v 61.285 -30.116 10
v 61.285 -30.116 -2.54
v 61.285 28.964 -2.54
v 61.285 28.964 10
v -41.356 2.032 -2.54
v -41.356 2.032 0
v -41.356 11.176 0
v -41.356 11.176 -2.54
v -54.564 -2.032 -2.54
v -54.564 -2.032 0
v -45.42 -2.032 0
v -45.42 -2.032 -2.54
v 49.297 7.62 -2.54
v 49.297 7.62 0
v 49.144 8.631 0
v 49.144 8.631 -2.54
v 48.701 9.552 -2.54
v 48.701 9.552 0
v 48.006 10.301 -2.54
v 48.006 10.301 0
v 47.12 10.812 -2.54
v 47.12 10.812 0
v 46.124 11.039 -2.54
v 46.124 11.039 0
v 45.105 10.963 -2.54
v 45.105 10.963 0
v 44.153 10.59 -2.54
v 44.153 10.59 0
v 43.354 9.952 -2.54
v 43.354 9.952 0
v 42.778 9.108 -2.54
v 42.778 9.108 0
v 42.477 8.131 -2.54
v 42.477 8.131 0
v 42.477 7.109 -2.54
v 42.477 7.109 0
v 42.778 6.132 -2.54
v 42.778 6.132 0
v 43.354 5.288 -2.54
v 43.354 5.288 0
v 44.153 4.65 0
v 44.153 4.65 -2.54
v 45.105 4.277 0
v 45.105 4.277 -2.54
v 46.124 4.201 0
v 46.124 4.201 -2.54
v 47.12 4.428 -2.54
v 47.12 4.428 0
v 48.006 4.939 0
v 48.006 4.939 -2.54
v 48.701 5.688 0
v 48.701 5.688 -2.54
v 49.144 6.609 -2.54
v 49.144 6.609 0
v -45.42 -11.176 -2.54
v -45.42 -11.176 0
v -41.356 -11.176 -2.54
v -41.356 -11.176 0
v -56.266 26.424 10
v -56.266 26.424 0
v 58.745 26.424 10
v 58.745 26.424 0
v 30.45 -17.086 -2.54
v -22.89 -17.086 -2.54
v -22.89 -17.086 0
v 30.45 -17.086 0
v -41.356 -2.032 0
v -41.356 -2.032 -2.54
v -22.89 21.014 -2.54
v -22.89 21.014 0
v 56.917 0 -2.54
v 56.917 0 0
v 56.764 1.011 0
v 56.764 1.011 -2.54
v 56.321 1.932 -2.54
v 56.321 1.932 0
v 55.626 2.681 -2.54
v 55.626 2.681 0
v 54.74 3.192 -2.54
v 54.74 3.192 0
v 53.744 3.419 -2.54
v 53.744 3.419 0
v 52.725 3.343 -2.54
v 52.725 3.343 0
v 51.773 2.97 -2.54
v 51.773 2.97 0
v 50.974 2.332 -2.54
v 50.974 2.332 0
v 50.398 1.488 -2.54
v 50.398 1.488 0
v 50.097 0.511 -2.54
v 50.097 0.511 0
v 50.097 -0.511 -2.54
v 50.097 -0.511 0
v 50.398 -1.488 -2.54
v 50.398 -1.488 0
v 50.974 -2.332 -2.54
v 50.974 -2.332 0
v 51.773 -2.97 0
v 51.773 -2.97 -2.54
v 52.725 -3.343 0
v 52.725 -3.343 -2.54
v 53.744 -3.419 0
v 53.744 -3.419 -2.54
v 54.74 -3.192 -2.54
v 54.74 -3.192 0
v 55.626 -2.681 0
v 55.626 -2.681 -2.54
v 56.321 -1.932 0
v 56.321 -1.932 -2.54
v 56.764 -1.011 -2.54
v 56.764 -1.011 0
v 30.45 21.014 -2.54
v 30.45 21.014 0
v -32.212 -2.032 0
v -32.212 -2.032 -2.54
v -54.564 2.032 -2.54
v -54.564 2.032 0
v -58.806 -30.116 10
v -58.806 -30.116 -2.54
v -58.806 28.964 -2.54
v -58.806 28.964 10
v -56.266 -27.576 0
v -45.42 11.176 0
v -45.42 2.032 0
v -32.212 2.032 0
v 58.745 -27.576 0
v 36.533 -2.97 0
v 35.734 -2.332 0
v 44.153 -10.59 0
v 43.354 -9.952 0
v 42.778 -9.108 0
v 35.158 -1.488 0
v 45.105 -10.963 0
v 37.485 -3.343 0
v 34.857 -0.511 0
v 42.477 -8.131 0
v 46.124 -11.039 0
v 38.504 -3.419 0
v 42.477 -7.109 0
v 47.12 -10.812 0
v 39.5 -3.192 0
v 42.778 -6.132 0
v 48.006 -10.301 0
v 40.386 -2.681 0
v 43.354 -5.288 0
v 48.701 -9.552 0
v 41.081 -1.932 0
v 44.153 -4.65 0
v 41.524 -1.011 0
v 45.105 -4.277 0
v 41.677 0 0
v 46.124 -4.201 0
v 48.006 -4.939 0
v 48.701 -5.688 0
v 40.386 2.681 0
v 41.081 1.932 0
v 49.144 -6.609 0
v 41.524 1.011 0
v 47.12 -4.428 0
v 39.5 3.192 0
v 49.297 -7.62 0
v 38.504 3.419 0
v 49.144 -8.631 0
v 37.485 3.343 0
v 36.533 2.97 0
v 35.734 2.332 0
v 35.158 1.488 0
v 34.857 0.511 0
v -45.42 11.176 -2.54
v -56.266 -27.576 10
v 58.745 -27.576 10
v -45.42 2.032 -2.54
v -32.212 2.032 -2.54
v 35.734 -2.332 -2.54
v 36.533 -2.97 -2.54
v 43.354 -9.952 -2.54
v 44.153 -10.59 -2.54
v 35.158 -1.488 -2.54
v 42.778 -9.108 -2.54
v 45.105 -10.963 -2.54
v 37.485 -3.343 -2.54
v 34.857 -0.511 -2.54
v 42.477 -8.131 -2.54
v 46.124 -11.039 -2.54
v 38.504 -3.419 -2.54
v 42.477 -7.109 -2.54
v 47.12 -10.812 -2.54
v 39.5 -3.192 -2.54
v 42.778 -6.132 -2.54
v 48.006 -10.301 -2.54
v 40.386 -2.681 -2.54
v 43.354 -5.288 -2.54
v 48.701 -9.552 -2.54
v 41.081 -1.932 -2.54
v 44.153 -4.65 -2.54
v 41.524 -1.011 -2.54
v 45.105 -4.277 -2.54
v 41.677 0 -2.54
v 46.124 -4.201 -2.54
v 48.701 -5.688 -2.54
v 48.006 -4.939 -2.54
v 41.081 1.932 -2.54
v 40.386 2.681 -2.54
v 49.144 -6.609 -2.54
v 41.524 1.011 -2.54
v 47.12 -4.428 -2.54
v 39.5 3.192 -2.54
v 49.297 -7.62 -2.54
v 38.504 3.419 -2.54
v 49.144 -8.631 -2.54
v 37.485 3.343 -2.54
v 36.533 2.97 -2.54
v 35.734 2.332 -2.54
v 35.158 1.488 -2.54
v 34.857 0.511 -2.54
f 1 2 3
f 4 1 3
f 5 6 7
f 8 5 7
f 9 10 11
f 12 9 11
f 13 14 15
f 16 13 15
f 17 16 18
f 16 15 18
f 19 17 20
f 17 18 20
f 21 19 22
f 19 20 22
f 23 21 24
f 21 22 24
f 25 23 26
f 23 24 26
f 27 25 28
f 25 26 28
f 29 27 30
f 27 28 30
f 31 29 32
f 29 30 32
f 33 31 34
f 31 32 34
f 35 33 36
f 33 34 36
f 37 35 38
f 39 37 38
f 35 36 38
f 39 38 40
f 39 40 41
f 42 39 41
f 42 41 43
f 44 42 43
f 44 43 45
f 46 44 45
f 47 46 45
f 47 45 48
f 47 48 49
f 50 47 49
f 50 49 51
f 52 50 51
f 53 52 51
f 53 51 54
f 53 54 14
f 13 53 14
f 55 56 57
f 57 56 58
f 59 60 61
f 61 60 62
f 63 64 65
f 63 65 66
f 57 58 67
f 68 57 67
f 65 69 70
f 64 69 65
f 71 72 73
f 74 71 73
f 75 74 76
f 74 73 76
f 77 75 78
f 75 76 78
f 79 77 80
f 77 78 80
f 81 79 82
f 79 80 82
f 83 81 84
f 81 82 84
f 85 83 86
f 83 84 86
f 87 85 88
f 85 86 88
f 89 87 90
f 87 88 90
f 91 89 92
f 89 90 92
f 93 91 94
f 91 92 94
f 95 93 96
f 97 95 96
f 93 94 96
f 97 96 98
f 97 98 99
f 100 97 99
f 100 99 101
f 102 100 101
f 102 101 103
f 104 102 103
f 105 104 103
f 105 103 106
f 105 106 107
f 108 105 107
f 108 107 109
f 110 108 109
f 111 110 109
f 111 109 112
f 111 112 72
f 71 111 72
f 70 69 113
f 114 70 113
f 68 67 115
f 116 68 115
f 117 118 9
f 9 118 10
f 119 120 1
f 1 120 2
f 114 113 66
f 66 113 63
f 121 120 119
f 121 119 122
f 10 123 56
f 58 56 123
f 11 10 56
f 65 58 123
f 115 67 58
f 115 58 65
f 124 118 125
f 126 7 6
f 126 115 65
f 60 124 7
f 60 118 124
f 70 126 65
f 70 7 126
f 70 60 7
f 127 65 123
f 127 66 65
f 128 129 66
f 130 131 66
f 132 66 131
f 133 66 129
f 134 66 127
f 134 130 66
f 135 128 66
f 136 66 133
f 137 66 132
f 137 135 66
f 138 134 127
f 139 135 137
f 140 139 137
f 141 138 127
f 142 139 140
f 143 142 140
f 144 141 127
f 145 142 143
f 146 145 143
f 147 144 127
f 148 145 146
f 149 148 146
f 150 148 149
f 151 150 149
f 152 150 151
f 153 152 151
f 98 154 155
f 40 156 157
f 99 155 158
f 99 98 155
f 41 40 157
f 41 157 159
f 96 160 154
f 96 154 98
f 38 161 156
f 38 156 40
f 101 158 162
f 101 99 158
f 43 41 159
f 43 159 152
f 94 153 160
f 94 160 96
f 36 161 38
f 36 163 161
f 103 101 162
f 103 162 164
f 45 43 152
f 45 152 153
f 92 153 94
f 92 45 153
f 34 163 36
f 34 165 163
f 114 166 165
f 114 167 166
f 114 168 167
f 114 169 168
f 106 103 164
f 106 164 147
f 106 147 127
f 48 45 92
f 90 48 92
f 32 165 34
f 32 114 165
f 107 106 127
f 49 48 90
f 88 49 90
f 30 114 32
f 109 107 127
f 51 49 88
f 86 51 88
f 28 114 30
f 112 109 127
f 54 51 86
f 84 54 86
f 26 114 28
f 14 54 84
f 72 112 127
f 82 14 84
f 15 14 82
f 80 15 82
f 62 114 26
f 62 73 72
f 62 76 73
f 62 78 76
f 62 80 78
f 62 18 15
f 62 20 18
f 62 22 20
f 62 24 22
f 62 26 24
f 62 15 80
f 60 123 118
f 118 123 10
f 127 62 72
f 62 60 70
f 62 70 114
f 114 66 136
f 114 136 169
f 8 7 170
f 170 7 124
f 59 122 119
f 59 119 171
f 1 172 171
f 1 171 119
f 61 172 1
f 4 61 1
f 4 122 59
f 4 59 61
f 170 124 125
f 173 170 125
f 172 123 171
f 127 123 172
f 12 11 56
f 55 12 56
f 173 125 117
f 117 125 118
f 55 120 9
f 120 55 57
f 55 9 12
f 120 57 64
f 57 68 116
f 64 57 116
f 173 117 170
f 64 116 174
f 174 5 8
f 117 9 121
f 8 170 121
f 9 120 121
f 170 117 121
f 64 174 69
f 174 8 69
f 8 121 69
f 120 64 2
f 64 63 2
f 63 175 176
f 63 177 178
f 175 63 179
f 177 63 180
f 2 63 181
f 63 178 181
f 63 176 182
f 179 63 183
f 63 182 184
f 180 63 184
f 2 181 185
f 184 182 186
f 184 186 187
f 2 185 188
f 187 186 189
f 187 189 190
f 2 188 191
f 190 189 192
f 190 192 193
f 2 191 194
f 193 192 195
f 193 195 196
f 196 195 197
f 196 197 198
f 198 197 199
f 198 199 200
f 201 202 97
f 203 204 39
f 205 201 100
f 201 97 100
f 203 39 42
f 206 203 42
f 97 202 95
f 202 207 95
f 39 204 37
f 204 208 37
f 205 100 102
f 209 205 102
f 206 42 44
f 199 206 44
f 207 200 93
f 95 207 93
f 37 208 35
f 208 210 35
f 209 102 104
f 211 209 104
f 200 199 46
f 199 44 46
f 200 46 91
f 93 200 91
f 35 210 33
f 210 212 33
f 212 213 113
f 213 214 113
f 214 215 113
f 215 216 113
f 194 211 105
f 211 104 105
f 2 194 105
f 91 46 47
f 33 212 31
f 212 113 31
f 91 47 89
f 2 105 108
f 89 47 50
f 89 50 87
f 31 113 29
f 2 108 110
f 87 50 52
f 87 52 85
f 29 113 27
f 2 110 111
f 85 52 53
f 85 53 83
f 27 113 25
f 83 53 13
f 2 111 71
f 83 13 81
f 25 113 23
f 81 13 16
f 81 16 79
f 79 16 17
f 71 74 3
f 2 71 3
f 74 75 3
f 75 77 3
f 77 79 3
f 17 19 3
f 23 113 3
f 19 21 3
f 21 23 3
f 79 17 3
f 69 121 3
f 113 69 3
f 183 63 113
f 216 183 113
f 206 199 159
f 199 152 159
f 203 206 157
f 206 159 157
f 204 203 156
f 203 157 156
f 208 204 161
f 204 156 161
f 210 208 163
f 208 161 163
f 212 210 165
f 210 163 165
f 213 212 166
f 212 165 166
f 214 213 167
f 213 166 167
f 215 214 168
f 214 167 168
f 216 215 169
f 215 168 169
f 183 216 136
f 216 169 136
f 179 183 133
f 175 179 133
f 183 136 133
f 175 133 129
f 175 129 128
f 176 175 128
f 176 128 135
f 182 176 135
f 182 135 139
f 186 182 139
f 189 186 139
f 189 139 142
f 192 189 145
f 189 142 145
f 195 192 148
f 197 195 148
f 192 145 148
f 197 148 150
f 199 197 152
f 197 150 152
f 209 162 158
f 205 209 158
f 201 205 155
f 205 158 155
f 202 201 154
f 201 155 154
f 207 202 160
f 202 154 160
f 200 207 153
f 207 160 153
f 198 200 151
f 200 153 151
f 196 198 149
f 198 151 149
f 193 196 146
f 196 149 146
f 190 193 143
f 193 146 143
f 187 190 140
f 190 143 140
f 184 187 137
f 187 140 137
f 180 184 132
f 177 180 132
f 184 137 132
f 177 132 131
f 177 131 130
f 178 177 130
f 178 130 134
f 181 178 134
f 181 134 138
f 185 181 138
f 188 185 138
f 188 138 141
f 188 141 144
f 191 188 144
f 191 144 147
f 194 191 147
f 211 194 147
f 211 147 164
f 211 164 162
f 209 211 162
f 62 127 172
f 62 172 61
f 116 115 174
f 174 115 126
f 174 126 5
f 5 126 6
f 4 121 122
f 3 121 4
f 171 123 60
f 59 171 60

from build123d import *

# Parameters (mm, degrees)
F0_W     = 115.0112
F0_H     = 54.0004
F1_DEPTH = 10
F2_T     = 2.54
F3_W     = 53.34
F3_H     = 38.1
F4_DEPTH = 12.7
F6_DEPTH = 12.7
F7_R     = 3.429
F8_DEPTH = 12.7


with BuildPart() as f1:
    # F0 (on Top) → F1 (new body)
    with BuildSketch(Plane.XY):
        with Locations((1.2398222461, -0.5762684962)):
            Rectangle(F0_W, F0_H)
    extrude(amount=F1_DEPTH)

    # F2
    f2_openings = [f1.faces().sort_by_distance(p)[0] for p in [
        (1.239822, -0.576268, 10),
    ]]
    offset(amount=F2_T, openings=f2_openings, kind=Kind.INTERSECTION)

    # F3 (on face) → F4 (cut, symmetric)
    with BuildSketch(Plane(origin=(0, 0, -2.54), x_dir=(1, 0, 0), z_dir=(0, 0, -1))):
        with Locations((3.7798222461, -1.9637315038)):
            Rectangle(F3_W, F3_H)
    extrude(amount=F4_DEPTH, both=True, mode=Mode.SUBTRACT)

    # F5 (on Top) → F6 (cut, symmetric)
    with BuildSketch(Plane.XY):
        Polygon((-45.4199777539, -2.032), (-45.4199777539, -11.176), (-41.3559777539, -11.176), (-41.3559777539, -2.032), (-32.2119777539, -2.032), (-32.2119777539, 2.032), (-41.3559777539, 2.032), (-41.3559777539, 11.176), (-45.4199777539, 11.176), (-45.4199777539, 2.032), (-54.5639777539, 2.032), (-54.5639777539, -2.032), align=None)
    extrude(amount=F6_DEPTH, both=True, mode=Mode.SUBTRACT)

    # F7 (on Top) → F8 (cut, symmetric)
    with BuildSketch(Plane.XY):
        with Locations((45.8676222461, -7.62)):
            Circle(F7_R)
        with Locations((53.4876222461, 0)):
            Circle(F7_R)
        with Locations((45.8676222461, 7.62)):
            Circle(F7_R)
        with Locations((38.2476222461, 0)):
            Circle(F7_R)
    extrude(amount=F8_DEPTH, both=True, mode=Mode.SUBTRACT)


solid = f1.part
